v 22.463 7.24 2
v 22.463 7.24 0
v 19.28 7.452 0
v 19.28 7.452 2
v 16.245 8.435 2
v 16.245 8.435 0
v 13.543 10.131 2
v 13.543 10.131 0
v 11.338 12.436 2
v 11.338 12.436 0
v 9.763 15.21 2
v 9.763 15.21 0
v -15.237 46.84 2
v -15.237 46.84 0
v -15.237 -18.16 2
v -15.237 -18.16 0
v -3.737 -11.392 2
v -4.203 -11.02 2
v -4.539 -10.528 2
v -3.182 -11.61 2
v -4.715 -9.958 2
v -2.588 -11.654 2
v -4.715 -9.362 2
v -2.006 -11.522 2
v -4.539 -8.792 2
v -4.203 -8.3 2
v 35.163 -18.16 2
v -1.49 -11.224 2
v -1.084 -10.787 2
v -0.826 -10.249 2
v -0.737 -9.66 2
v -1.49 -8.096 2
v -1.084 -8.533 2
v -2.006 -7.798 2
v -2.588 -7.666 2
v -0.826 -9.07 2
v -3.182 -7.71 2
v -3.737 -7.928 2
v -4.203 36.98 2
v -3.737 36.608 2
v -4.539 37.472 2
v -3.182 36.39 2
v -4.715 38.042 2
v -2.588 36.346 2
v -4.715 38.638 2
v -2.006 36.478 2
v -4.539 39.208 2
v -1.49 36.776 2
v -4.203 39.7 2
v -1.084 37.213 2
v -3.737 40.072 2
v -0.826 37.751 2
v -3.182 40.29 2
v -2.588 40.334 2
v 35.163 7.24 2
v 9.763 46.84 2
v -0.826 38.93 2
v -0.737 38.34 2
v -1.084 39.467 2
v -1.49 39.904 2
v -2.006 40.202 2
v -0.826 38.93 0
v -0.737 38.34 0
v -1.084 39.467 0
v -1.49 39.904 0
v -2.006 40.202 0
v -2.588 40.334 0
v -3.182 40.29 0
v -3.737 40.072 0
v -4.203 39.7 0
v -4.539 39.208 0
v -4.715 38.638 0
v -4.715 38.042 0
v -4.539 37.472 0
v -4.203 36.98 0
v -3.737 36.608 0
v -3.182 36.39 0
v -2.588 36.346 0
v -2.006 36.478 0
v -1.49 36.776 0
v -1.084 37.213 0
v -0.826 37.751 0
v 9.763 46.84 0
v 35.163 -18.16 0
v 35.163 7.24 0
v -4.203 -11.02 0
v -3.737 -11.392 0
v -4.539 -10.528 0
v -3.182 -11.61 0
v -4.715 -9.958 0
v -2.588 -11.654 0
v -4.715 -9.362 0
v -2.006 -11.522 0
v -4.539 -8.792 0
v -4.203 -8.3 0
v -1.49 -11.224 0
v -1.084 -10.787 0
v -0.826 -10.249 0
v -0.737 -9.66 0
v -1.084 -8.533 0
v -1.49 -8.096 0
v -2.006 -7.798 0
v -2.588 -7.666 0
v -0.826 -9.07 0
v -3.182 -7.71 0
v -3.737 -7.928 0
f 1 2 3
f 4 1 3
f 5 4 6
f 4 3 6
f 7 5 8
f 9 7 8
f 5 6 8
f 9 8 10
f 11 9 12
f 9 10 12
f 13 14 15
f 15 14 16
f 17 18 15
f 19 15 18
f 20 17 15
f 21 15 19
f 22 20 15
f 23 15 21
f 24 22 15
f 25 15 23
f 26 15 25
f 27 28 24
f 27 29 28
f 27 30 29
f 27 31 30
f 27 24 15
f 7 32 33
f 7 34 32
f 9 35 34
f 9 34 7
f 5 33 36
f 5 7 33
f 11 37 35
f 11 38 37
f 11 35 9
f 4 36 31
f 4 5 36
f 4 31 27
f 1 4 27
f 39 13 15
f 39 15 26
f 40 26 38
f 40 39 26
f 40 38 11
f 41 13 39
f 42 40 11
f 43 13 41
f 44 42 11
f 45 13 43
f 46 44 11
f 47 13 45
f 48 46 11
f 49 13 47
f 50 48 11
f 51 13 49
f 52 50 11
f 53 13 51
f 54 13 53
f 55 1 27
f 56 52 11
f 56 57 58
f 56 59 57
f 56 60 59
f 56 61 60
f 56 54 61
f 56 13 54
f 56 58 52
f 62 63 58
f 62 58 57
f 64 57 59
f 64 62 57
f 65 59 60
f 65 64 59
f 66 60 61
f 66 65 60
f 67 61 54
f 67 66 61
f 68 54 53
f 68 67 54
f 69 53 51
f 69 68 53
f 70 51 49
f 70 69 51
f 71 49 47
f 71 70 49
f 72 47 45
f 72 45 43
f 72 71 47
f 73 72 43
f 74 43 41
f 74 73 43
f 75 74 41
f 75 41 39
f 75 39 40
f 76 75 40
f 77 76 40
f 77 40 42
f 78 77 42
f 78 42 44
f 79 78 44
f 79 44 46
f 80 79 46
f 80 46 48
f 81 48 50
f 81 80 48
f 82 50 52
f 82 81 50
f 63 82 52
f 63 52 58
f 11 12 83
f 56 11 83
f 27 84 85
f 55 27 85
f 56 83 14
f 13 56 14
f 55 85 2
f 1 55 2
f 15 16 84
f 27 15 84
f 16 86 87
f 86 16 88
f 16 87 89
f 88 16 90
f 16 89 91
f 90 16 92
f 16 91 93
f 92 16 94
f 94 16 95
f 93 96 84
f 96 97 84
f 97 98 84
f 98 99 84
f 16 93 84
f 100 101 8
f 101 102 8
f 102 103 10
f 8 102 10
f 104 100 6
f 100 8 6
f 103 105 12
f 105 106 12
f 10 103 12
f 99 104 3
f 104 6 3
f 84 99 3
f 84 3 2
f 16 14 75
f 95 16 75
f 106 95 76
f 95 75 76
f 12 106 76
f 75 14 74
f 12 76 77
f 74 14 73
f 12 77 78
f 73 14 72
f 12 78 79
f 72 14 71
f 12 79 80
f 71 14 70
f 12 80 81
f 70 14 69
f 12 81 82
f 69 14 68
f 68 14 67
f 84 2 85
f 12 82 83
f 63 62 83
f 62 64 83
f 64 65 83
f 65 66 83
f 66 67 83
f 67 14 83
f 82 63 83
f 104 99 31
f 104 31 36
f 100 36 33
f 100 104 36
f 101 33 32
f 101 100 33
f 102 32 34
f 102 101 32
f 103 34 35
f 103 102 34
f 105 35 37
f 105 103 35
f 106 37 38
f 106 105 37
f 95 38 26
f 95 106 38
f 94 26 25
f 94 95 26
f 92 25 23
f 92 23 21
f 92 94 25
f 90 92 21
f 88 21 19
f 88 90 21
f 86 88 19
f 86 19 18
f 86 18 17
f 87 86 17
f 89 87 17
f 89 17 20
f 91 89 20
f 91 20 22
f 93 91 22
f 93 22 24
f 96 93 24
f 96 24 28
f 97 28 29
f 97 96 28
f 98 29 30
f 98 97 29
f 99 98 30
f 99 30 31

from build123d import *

# Parameters (mm, degrees)
SKETCH1_R           = 2
BOSS_EXTRUDE1_DEPTH = 2


with BuildPart() as part:
    # Sketch1 → Boss-Extrude1 (new body)
    with BuildSketch(Plane.XY):
        with BuildLine():
            Line((-15.236964255, 46.840062703), (-15.236964255, -18.159937297))
            Line((-15.236964255, -18.159937297), (35.163035745, -18.159937297))
            Line((35.163035745, -18.159937297), (35.163035745, 7.240062703))
            Line((35.163035745, 7.240062703), (22.463035745, 7.240062703))
            ThreePointArc((22.463035745, 7.240062703), (14.841940785, 9.199641421), (9.763035745, 15.210112346))
            Line((9.763035745, 15.210112346), (9.763035745, 46.840062703))
            Line((9.763035745, 46.840062703), (-15.236964255, 46.840062703))
        make_face()
        with Locations((-2.736964255, -9.659937297)):
            Circle(SKETCH1_R, mode=Mode.SUBTRACT)
        with Locations((-2.736964255, 38.340062703)):
            Circle(SKETCH1_R, mode=Mode.SUBTRACT)
    extrude(amount=BOSS_EXTRUDE1_DEPTH)


solid = part.part
